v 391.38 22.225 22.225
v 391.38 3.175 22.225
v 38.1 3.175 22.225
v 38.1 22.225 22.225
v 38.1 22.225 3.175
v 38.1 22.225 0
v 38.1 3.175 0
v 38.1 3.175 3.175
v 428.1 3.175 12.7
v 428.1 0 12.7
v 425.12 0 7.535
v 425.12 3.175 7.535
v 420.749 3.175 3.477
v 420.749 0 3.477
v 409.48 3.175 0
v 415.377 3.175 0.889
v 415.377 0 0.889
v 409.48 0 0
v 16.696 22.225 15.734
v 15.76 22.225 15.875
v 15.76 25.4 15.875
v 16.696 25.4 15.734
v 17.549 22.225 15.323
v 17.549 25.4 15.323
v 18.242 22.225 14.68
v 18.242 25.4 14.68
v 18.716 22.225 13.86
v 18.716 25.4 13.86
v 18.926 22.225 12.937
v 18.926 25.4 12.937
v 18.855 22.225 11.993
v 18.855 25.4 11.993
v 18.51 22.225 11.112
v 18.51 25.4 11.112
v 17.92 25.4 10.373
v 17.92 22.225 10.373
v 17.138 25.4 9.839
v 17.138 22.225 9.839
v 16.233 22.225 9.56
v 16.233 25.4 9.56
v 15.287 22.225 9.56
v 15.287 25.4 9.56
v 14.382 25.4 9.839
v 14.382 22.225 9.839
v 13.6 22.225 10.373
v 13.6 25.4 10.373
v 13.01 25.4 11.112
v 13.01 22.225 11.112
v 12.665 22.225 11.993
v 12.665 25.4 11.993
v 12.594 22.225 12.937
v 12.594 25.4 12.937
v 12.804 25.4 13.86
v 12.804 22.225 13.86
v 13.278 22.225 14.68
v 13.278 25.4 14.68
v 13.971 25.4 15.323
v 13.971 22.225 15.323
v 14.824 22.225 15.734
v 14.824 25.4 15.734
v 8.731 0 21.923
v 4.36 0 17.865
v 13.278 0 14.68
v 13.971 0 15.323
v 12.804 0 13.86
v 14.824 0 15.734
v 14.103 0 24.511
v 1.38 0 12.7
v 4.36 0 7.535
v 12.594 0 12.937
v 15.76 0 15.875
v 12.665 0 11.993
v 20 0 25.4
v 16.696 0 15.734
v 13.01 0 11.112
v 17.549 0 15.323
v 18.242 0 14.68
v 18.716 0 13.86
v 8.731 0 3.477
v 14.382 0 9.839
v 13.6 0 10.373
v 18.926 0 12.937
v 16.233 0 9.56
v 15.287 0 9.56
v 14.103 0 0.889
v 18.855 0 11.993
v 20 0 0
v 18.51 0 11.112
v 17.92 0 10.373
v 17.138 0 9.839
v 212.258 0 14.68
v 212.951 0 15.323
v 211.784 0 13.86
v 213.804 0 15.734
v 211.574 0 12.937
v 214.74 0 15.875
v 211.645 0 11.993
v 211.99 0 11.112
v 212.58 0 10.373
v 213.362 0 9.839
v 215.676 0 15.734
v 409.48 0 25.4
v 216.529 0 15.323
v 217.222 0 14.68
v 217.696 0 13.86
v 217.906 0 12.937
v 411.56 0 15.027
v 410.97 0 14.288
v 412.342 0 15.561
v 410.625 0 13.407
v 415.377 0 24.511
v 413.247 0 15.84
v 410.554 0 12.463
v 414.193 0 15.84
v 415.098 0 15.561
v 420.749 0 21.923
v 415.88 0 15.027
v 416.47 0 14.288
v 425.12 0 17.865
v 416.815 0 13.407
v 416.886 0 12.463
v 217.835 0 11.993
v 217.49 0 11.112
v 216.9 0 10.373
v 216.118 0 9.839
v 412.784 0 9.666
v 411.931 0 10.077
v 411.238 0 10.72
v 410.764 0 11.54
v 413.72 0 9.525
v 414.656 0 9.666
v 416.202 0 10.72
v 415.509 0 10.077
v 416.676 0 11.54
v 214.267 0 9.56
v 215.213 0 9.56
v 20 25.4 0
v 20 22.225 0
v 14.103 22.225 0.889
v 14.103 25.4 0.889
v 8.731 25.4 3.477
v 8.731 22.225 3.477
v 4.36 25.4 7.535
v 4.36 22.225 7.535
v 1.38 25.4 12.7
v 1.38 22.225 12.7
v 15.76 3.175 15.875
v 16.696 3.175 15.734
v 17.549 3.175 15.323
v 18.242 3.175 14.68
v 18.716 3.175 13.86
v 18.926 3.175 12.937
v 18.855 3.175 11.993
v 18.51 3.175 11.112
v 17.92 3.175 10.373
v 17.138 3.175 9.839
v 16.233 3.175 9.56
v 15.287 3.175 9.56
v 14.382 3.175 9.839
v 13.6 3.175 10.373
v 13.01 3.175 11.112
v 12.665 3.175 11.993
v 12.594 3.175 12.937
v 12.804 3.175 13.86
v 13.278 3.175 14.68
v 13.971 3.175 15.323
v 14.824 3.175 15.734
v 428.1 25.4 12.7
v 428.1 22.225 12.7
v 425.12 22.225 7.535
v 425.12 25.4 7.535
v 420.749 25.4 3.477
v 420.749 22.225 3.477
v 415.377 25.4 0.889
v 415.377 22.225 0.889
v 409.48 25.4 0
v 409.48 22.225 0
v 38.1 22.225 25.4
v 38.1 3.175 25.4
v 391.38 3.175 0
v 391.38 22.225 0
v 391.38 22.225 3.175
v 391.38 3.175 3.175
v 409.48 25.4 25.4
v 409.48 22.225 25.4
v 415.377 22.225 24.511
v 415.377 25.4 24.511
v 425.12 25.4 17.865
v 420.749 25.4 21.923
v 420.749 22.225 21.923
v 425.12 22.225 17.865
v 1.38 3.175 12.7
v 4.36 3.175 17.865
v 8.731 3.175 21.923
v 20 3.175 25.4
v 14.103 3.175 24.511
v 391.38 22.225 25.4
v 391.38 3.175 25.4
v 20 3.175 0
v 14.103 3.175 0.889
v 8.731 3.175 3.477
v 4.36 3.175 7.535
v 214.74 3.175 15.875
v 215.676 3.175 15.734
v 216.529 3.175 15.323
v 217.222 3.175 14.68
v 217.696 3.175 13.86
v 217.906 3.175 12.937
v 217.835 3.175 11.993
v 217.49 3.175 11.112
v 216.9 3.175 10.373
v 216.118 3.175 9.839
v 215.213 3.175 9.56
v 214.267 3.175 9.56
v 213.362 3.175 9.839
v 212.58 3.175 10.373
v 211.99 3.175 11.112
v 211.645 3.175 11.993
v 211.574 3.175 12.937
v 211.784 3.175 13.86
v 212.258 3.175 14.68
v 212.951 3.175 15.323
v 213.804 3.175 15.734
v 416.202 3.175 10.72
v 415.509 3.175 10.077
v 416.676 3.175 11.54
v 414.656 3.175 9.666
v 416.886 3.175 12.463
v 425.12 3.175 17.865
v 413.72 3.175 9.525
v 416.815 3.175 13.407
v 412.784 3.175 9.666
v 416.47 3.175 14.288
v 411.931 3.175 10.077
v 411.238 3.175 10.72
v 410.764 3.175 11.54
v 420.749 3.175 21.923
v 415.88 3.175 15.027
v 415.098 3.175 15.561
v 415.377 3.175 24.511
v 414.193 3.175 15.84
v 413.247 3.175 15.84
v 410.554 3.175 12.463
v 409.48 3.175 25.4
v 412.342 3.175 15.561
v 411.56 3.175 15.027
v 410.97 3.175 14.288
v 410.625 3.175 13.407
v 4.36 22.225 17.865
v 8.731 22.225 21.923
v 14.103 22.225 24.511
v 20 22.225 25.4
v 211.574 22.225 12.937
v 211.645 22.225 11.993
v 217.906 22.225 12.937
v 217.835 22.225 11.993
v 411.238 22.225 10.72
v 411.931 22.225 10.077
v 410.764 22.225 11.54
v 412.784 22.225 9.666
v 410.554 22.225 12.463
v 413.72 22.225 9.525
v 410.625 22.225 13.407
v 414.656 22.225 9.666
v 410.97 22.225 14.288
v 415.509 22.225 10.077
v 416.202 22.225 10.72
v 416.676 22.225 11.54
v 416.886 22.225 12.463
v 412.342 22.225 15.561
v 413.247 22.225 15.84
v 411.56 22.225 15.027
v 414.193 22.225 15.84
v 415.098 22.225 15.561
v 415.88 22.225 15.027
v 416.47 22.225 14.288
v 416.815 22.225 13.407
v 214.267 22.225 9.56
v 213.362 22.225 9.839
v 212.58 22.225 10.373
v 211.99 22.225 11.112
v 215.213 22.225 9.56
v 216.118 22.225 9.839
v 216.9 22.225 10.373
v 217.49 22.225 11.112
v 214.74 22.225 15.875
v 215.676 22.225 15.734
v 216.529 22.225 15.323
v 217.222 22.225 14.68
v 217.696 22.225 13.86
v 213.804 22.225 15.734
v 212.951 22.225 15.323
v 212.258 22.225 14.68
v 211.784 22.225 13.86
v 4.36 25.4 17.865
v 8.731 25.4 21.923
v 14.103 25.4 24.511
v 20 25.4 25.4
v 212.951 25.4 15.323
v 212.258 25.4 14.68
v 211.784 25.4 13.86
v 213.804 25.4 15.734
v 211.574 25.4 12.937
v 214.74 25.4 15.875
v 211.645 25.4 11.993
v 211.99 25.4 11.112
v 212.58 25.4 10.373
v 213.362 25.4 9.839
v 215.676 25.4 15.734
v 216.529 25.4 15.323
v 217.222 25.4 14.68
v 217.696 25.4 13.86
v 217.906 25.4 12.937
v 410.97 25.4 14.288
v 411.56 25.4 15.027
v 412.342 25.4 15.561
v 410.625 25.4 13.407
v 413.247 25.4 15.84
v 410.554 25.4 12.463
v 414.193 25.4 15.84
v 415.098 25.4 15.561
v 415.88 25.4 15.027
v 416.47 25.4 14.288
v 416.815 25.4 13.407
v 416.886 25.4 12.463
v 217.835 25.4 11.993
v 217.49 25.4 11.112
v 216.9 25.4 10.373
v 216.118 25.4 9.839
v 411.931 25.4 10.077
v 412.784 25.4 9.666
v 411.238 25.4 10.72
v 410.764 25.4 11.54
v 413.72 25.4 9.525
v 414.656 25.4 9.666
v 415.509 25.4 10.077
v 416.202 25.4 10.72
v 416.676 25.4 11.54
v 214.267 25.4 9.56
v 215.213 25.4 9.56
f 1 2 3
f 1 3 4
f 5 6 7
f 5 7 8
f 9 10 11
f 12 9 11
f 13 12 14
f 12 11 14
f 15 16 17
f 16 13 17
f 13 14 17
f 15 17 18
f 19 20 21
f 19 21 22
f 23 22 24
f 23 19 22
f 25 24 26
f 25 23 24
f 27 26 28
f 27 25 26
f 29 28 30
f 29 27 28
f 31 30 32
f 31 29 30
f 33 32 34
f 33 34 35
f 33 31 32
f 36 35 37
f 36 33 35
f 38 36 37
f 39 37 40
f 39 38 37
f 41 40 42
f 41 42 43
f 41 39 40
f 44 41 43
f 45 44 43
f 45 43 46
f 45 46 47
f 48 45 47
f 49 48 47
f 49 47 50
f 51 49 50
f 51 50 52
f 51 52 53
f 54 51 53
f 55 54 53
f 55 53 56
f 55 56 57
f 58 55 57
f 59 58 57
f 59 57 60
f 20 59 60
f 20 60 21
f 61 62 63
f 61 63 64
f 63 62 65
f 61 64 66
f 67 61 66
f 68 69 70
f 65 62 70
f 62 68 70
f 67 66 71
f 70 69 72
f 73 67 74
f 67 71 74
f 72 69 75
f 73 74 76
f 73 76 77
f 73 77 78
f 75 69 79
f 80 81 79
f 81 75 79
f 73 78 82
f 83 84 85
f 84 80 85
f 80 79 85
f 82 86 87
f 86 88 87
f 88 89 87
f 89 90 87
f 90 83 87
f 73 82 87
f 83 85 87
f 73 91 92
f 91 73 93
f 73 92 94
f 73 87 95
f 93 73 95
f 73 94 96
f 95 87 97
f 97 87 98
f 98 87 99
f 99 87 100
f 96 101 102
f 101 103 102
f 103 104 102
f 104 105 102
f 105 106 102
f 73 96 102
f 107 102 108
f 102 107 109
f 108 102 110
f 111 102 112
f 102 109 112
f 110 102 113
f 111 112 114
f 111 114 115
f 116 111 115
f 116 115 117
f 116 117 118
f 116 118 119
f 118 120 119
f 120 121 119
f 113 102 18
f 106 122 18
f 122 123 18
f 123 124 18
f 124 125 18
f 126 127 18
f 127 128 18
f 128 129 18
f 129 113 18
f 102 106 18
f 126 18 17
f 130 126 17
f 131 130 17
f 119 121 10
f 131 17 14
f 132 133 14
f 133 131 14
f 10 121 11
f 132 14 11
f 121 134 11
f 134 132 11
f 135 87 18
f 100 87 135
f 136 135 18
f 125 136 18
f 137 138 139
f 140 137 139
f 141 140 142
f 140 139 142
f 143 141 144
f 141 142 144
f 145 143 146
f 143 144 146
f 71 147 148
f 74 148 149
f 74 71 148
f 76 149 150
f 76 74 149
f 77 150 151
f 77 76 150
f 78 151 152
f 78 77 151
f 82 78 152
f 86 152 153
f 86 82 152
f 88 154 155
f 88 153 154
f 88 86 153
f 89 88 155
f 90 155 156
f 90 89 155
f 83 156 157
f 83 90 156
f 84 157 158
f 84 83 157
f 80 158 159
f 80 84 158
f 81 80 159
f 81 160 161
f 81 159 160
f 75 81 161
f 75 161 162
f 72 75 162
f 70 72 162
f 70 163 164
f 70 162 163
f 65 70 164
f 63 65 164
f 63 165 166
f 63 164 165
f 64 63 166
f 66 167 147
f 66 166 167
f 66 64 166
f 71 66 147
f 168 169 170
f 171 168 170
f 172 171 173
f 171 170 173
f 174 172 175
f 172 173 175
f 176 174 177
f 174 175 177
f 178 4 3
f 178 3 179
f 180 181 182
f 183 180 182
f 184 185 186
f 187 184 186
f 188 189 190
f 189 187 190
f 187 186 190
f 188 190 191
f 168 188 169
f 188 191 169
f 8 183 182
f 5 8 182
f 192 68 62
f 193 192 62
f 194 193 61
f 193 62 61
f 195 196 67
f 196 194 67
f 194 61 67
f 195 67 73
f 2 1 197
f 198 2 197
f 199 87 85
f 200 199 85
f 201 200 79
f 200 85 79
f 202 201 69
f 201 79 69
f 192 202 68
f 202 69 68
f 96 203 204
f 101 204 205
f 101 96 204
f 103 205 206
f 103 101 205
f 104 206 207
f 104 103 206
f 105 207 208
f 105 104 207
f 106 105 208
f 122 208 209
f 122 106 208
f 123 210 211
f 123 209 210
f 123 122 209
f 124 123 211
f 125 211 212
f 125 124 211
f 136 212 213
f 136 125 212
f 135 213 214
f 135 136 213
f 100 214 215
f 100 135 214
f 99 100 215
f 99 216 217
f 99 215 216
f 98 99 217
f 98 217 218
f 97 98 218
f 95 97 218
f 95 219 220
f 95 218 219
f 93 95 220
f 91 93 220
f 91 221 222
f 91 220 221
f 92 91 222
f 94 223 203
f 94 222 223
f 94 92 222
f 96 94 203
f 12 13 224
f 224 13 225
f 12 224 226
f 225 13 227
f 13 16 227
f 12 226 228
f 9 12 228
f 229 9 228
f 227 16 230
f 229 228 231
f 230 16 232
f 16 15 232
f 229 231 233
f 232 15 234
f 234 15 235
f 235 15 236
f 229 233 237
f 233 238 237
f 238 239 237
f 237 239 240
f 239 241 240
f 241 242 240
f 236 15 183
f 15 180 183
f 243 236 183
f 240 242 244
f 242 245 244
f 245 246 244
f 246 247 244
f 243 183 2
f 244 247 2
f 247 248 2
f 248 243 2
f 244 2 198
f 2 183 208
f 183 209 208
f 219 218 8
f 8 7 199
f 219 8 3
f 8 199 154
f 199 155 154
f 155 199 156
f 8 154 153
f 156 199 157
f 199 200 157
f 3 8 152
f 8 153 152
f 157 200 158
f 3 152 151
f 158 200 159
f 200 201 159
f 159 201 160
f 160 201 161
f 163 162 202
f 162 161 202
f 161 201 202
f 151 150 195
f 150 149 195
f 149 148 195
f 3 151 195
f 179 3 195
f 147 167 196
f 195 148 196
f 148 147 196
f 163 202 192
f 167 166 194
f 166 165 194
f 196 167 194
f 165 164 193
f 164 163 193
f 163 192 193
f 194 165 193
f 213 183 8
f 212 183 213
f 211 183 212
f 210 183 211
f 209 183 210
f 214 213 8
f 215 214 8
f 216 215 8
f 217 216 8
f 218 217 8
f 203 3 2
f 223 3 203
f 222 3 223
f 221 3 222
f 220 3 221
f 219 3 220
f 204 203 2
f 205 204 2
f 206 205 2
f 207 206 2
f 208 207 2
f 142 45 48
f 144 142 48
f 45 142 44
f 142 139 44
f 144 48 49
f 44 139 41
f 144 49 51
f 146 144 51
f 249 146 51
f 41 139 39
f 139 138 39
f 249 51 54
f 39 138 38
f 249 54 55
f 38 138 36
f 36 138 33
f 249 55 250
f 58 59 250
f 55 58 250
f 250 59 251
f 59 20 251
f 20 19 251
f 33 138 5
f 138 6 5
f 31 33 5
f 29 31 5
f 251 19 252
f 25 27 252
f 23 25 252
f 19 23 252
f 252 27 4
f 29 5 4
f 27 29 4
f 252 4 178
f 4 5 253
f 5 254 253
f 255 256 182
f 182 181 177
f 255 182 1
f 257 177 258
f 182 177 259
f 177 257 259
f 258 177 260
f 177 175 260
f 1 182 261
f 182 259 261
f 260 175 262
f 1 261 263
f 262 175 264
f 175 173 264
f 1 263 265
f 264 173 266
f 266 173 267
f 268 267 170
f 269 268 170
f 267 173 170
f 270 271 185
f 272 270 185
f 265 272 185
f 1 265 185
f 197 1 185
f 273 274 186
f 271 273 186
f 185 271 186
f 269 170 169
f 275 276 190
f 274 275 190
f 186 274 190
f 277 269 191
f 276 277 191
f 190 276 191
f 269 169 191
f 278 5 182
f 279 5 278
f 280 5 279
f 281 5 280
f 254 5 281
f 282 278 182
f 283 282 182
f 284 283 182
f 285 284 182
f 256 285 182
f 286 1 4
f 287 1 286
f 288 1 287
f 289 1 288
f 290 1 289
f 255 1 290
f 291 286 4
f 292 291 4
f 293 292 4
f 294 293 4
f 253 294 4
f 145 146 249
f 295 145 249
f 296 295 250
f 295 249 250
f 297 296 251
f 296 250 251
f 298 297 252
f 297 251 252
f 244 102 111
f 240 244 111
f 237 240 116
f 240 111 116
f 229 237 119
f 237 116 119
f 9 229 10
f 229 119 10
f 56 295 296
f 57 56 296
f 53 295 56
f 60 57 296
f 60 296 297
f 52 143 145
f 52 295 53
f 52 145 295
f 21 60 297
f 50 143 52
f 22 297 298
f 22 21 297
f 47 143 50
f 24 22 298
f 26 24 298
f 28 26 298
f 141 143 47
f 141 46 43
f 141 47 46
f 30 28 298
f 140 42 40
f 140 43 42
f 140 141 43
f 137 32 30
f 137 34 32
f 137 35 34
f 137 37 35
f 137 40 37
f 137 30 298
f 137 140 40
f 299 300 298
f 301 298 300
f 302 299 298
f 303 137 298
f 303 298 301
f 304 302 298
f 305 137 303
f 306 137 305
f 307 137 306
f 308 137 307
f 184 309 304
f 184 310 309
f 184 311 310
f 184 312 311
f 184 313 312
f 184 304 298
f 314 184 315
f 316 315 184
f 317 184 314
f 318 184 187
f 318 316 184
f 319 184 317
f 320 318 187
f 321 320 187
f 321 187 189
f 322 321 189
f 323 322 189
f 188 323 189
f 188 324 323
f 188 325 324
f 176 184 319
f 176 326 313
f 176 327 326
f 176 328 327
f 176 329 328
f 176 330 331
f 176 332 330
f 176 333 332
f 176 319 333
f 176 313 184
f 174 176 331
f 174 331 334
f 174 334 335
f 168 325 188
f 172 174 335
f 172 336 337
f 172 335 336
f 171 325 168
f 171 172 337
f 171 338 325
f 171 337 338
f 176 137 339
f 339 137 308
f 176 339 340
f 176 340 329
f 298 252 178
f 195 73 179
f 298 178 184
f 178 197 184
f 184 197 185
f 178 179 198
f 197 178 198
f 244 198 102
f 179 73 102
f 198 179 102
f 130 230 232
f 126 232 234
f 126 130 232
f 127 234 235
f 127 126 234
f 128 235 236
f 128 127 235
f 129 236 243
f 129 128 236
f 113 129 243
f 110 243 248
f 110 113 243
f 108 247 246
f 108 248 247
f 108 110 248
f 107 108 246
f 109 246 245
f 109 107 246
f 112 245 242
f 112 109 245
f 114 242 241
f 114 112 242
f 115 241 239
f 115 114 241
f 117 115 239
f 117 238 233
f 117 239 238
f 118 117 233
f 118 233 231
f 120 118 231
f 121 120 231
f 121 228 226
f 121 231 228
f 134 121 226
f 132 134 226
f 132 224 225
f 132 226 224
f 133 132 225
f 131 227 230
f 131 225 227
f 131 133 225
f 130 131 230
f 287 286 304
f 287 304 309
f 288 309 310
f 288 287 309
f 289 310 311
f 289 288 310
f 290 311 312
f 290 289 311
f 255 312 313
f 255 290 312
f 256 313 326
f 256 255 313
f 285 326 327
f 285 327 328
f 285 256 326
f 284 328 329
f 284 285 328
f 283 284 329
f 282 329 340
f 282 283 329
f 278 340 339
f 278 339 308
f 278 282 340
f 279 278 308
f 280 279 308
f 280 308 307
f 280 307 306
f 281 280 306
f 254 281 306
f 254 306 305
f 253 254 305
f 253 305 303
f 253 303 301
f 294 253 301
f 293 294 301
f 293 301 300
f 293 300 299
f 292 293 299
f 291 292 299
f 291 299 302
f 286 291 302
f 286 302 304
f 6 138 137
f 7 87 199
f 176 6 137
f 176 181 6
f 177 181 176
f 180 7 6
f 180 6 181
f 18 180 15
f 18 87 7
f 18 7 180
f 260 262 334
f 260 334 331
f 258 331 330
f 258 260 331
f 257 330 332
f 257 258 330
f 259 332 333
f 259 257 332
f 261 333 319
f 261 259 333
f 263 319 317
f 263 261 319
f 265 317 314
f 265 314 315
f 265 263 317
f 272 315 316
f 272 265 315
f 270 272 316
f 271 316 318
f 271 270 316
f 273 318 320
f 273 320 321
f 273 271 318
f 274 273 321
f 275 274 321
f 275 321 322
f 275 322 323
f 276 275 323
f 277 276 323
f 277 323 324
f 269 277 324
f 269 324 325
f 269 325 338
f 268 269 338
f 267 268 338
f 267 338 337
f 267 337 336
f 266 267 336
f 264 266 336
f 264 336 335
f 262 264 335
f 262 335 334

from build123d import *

# Parameters (mm, degrees)
SKETCH1_W           = 429.48
SKETCH1_H           = 25.4
SKETCH1_R           = 3.175
BOSS_EXTRUDE1_DEPTH = 25.4
CUT_EXTRUDE1_REACH  = 432.98
SKETCH2_W           = 19.05
SKETCH2_H           = 19.05
SKETCH4_W           = 25.4
SKETCH4_H           = 19.05
CUT_EXTRUDE2_DEPTH  = 38.1
FILLET1_R           = 20


with BuildPart() as part:
    # Sketch1 → Boss-Extrude1 (new body)
    with BuildSketch(Plane(origin=(0, 0, 0), x_dir=(1, 0, 0), z_dir=(0, 1, 0))):
        with Locations((214.74, -12.7)):
            Rectangle(SKETCH1_W, SKETCH1_H)
        with Locations(Location((214.74, -12.7, 0), (0, 0, 270))):
            Circle(SKETCH1_R, mode=Mode.SUBTRACT)
        with Locations(Location((15.76, -12.7, 0), (0, 0, 270))):
            Circle(SKETCH1_R, mode=Mode.SUBTRACT)
        with Locations(Location((413.72, -12.7, 0), (0, 0, 90))):
            Circle(SKETCH1_R, mode=Mode.SUBTRACT)
    extrude(amount=BOSS_EXTRUDE1_DEPTH)

    # Cut-Extrude1: up to this face of the body (flat: up to its plane)
    cut_extrude1_end = Plane(part.part.faces().sort_by_distance((429.48, 12.7, 12.7))[0])
    # Sketch2 → Cut-Extrude1 (cut, up to the picked face)
    with BuildSketch(Plane.ZY, mode=Mode.PRIVATE) as cut_extrude1_sk1:
        with Locations((12.7, 12.7)):
            Rectangle(SKETCH2_W, SKETCH2_H)
    cut_extrude1_tool1 = split(extrude(cut_extrude1_sk1.sketch, amount=-CUT_EXTRUDE1_REACH, mode=Mode.PRIVATE), bisect_by=cut_extrude1_end, keep=Keep.BOTH, mode=Mode.PRIVATE)
    add(cut_extrude1_tool1.solids().sort_by(Axis((0, 12.7, 12.7), (1, 0, 0)))[0], mode=Mode.SUBTRACT)

    # Sketch4 → Cut-Extrude2 (cut)
    with BuildSketch(Plane.ZY):
        with Locations((12.7, 12.7)):
            Rectangle(SKETCH4_W, SKETCH4_H)
    cut_extrude2 = extrude(amount=-CUT_EXTRUDE2_DEPTH, mode=Mode.SUBTRACT)

    # Mirror1: Cut-Extrude2 across plane
    add(cut_extrude2.mirror(Plane.ZY.offset(-214.74)), mode=Mode.SUBTRACT)

    # Fillet1
    # the kernel refuses this fillet: 20 mm, written as the material it takes off along each edge
    with BuildSketch(Plane(origin=(429.48, -50, 0), x_dir=(-1, 0, 0), z_dir=(0, 1, 0)), Plane(origin=(429.48, -27.775, 0), x_dir=(-1, 0, 0), z_dir=(0, 1, 0)), Plane(origin=(0, -27.775, 25.4), x_dir=(1, 0, 0), z_dir=(0, 1, 0))) as fillet1_piece_1:
        with BuildLine():
            CenterArc((FILLET1_R, FILLET1_R), FILLET1_R, 180, 90)
            Line((0, FILLET1_R), (0, 0))
            Line((0, 0), (FILLET1_R, 0))
        make_face()
    extrude(amount=103.175, mode=Mode.SUBTRACT)
    with BuildSketch(Plane(origin=(429.48, -50, 25.4), x_dir=(-1, 0, 0), z_dir=(0, 1, 0)), Plane(origin=(429.48, -27.775, 25.4), x_dir=(-1, 0, 0), z_dir=(0, 1, 0)), Plane(origin=(0, -50, 25.4), x_dir=(0, 0, -1), z_dir=(0, 1, 0)), Plane(origin=(0, -50, 0), x_dir=(1, 0, 0), z_dir=(0, 1, 0)), Plane(origin=(0, -27.775, 0), x_dir=(1, 0, 0), z_dir=(0, 1, 0))) as fillet1_piece_2:
        with BuildLine():
            CenterArc((FILLET1_R, -FILLET1_R), FILLET1_R, 90, 90)
            Line((0, -FILLET1_R), (0, 0))
            Line((0, 0), (FILLET1_R, 0))
        make_face()
    extrude(amount=103.175, mode=Mode.SUBTRACT)


solid = part.part
